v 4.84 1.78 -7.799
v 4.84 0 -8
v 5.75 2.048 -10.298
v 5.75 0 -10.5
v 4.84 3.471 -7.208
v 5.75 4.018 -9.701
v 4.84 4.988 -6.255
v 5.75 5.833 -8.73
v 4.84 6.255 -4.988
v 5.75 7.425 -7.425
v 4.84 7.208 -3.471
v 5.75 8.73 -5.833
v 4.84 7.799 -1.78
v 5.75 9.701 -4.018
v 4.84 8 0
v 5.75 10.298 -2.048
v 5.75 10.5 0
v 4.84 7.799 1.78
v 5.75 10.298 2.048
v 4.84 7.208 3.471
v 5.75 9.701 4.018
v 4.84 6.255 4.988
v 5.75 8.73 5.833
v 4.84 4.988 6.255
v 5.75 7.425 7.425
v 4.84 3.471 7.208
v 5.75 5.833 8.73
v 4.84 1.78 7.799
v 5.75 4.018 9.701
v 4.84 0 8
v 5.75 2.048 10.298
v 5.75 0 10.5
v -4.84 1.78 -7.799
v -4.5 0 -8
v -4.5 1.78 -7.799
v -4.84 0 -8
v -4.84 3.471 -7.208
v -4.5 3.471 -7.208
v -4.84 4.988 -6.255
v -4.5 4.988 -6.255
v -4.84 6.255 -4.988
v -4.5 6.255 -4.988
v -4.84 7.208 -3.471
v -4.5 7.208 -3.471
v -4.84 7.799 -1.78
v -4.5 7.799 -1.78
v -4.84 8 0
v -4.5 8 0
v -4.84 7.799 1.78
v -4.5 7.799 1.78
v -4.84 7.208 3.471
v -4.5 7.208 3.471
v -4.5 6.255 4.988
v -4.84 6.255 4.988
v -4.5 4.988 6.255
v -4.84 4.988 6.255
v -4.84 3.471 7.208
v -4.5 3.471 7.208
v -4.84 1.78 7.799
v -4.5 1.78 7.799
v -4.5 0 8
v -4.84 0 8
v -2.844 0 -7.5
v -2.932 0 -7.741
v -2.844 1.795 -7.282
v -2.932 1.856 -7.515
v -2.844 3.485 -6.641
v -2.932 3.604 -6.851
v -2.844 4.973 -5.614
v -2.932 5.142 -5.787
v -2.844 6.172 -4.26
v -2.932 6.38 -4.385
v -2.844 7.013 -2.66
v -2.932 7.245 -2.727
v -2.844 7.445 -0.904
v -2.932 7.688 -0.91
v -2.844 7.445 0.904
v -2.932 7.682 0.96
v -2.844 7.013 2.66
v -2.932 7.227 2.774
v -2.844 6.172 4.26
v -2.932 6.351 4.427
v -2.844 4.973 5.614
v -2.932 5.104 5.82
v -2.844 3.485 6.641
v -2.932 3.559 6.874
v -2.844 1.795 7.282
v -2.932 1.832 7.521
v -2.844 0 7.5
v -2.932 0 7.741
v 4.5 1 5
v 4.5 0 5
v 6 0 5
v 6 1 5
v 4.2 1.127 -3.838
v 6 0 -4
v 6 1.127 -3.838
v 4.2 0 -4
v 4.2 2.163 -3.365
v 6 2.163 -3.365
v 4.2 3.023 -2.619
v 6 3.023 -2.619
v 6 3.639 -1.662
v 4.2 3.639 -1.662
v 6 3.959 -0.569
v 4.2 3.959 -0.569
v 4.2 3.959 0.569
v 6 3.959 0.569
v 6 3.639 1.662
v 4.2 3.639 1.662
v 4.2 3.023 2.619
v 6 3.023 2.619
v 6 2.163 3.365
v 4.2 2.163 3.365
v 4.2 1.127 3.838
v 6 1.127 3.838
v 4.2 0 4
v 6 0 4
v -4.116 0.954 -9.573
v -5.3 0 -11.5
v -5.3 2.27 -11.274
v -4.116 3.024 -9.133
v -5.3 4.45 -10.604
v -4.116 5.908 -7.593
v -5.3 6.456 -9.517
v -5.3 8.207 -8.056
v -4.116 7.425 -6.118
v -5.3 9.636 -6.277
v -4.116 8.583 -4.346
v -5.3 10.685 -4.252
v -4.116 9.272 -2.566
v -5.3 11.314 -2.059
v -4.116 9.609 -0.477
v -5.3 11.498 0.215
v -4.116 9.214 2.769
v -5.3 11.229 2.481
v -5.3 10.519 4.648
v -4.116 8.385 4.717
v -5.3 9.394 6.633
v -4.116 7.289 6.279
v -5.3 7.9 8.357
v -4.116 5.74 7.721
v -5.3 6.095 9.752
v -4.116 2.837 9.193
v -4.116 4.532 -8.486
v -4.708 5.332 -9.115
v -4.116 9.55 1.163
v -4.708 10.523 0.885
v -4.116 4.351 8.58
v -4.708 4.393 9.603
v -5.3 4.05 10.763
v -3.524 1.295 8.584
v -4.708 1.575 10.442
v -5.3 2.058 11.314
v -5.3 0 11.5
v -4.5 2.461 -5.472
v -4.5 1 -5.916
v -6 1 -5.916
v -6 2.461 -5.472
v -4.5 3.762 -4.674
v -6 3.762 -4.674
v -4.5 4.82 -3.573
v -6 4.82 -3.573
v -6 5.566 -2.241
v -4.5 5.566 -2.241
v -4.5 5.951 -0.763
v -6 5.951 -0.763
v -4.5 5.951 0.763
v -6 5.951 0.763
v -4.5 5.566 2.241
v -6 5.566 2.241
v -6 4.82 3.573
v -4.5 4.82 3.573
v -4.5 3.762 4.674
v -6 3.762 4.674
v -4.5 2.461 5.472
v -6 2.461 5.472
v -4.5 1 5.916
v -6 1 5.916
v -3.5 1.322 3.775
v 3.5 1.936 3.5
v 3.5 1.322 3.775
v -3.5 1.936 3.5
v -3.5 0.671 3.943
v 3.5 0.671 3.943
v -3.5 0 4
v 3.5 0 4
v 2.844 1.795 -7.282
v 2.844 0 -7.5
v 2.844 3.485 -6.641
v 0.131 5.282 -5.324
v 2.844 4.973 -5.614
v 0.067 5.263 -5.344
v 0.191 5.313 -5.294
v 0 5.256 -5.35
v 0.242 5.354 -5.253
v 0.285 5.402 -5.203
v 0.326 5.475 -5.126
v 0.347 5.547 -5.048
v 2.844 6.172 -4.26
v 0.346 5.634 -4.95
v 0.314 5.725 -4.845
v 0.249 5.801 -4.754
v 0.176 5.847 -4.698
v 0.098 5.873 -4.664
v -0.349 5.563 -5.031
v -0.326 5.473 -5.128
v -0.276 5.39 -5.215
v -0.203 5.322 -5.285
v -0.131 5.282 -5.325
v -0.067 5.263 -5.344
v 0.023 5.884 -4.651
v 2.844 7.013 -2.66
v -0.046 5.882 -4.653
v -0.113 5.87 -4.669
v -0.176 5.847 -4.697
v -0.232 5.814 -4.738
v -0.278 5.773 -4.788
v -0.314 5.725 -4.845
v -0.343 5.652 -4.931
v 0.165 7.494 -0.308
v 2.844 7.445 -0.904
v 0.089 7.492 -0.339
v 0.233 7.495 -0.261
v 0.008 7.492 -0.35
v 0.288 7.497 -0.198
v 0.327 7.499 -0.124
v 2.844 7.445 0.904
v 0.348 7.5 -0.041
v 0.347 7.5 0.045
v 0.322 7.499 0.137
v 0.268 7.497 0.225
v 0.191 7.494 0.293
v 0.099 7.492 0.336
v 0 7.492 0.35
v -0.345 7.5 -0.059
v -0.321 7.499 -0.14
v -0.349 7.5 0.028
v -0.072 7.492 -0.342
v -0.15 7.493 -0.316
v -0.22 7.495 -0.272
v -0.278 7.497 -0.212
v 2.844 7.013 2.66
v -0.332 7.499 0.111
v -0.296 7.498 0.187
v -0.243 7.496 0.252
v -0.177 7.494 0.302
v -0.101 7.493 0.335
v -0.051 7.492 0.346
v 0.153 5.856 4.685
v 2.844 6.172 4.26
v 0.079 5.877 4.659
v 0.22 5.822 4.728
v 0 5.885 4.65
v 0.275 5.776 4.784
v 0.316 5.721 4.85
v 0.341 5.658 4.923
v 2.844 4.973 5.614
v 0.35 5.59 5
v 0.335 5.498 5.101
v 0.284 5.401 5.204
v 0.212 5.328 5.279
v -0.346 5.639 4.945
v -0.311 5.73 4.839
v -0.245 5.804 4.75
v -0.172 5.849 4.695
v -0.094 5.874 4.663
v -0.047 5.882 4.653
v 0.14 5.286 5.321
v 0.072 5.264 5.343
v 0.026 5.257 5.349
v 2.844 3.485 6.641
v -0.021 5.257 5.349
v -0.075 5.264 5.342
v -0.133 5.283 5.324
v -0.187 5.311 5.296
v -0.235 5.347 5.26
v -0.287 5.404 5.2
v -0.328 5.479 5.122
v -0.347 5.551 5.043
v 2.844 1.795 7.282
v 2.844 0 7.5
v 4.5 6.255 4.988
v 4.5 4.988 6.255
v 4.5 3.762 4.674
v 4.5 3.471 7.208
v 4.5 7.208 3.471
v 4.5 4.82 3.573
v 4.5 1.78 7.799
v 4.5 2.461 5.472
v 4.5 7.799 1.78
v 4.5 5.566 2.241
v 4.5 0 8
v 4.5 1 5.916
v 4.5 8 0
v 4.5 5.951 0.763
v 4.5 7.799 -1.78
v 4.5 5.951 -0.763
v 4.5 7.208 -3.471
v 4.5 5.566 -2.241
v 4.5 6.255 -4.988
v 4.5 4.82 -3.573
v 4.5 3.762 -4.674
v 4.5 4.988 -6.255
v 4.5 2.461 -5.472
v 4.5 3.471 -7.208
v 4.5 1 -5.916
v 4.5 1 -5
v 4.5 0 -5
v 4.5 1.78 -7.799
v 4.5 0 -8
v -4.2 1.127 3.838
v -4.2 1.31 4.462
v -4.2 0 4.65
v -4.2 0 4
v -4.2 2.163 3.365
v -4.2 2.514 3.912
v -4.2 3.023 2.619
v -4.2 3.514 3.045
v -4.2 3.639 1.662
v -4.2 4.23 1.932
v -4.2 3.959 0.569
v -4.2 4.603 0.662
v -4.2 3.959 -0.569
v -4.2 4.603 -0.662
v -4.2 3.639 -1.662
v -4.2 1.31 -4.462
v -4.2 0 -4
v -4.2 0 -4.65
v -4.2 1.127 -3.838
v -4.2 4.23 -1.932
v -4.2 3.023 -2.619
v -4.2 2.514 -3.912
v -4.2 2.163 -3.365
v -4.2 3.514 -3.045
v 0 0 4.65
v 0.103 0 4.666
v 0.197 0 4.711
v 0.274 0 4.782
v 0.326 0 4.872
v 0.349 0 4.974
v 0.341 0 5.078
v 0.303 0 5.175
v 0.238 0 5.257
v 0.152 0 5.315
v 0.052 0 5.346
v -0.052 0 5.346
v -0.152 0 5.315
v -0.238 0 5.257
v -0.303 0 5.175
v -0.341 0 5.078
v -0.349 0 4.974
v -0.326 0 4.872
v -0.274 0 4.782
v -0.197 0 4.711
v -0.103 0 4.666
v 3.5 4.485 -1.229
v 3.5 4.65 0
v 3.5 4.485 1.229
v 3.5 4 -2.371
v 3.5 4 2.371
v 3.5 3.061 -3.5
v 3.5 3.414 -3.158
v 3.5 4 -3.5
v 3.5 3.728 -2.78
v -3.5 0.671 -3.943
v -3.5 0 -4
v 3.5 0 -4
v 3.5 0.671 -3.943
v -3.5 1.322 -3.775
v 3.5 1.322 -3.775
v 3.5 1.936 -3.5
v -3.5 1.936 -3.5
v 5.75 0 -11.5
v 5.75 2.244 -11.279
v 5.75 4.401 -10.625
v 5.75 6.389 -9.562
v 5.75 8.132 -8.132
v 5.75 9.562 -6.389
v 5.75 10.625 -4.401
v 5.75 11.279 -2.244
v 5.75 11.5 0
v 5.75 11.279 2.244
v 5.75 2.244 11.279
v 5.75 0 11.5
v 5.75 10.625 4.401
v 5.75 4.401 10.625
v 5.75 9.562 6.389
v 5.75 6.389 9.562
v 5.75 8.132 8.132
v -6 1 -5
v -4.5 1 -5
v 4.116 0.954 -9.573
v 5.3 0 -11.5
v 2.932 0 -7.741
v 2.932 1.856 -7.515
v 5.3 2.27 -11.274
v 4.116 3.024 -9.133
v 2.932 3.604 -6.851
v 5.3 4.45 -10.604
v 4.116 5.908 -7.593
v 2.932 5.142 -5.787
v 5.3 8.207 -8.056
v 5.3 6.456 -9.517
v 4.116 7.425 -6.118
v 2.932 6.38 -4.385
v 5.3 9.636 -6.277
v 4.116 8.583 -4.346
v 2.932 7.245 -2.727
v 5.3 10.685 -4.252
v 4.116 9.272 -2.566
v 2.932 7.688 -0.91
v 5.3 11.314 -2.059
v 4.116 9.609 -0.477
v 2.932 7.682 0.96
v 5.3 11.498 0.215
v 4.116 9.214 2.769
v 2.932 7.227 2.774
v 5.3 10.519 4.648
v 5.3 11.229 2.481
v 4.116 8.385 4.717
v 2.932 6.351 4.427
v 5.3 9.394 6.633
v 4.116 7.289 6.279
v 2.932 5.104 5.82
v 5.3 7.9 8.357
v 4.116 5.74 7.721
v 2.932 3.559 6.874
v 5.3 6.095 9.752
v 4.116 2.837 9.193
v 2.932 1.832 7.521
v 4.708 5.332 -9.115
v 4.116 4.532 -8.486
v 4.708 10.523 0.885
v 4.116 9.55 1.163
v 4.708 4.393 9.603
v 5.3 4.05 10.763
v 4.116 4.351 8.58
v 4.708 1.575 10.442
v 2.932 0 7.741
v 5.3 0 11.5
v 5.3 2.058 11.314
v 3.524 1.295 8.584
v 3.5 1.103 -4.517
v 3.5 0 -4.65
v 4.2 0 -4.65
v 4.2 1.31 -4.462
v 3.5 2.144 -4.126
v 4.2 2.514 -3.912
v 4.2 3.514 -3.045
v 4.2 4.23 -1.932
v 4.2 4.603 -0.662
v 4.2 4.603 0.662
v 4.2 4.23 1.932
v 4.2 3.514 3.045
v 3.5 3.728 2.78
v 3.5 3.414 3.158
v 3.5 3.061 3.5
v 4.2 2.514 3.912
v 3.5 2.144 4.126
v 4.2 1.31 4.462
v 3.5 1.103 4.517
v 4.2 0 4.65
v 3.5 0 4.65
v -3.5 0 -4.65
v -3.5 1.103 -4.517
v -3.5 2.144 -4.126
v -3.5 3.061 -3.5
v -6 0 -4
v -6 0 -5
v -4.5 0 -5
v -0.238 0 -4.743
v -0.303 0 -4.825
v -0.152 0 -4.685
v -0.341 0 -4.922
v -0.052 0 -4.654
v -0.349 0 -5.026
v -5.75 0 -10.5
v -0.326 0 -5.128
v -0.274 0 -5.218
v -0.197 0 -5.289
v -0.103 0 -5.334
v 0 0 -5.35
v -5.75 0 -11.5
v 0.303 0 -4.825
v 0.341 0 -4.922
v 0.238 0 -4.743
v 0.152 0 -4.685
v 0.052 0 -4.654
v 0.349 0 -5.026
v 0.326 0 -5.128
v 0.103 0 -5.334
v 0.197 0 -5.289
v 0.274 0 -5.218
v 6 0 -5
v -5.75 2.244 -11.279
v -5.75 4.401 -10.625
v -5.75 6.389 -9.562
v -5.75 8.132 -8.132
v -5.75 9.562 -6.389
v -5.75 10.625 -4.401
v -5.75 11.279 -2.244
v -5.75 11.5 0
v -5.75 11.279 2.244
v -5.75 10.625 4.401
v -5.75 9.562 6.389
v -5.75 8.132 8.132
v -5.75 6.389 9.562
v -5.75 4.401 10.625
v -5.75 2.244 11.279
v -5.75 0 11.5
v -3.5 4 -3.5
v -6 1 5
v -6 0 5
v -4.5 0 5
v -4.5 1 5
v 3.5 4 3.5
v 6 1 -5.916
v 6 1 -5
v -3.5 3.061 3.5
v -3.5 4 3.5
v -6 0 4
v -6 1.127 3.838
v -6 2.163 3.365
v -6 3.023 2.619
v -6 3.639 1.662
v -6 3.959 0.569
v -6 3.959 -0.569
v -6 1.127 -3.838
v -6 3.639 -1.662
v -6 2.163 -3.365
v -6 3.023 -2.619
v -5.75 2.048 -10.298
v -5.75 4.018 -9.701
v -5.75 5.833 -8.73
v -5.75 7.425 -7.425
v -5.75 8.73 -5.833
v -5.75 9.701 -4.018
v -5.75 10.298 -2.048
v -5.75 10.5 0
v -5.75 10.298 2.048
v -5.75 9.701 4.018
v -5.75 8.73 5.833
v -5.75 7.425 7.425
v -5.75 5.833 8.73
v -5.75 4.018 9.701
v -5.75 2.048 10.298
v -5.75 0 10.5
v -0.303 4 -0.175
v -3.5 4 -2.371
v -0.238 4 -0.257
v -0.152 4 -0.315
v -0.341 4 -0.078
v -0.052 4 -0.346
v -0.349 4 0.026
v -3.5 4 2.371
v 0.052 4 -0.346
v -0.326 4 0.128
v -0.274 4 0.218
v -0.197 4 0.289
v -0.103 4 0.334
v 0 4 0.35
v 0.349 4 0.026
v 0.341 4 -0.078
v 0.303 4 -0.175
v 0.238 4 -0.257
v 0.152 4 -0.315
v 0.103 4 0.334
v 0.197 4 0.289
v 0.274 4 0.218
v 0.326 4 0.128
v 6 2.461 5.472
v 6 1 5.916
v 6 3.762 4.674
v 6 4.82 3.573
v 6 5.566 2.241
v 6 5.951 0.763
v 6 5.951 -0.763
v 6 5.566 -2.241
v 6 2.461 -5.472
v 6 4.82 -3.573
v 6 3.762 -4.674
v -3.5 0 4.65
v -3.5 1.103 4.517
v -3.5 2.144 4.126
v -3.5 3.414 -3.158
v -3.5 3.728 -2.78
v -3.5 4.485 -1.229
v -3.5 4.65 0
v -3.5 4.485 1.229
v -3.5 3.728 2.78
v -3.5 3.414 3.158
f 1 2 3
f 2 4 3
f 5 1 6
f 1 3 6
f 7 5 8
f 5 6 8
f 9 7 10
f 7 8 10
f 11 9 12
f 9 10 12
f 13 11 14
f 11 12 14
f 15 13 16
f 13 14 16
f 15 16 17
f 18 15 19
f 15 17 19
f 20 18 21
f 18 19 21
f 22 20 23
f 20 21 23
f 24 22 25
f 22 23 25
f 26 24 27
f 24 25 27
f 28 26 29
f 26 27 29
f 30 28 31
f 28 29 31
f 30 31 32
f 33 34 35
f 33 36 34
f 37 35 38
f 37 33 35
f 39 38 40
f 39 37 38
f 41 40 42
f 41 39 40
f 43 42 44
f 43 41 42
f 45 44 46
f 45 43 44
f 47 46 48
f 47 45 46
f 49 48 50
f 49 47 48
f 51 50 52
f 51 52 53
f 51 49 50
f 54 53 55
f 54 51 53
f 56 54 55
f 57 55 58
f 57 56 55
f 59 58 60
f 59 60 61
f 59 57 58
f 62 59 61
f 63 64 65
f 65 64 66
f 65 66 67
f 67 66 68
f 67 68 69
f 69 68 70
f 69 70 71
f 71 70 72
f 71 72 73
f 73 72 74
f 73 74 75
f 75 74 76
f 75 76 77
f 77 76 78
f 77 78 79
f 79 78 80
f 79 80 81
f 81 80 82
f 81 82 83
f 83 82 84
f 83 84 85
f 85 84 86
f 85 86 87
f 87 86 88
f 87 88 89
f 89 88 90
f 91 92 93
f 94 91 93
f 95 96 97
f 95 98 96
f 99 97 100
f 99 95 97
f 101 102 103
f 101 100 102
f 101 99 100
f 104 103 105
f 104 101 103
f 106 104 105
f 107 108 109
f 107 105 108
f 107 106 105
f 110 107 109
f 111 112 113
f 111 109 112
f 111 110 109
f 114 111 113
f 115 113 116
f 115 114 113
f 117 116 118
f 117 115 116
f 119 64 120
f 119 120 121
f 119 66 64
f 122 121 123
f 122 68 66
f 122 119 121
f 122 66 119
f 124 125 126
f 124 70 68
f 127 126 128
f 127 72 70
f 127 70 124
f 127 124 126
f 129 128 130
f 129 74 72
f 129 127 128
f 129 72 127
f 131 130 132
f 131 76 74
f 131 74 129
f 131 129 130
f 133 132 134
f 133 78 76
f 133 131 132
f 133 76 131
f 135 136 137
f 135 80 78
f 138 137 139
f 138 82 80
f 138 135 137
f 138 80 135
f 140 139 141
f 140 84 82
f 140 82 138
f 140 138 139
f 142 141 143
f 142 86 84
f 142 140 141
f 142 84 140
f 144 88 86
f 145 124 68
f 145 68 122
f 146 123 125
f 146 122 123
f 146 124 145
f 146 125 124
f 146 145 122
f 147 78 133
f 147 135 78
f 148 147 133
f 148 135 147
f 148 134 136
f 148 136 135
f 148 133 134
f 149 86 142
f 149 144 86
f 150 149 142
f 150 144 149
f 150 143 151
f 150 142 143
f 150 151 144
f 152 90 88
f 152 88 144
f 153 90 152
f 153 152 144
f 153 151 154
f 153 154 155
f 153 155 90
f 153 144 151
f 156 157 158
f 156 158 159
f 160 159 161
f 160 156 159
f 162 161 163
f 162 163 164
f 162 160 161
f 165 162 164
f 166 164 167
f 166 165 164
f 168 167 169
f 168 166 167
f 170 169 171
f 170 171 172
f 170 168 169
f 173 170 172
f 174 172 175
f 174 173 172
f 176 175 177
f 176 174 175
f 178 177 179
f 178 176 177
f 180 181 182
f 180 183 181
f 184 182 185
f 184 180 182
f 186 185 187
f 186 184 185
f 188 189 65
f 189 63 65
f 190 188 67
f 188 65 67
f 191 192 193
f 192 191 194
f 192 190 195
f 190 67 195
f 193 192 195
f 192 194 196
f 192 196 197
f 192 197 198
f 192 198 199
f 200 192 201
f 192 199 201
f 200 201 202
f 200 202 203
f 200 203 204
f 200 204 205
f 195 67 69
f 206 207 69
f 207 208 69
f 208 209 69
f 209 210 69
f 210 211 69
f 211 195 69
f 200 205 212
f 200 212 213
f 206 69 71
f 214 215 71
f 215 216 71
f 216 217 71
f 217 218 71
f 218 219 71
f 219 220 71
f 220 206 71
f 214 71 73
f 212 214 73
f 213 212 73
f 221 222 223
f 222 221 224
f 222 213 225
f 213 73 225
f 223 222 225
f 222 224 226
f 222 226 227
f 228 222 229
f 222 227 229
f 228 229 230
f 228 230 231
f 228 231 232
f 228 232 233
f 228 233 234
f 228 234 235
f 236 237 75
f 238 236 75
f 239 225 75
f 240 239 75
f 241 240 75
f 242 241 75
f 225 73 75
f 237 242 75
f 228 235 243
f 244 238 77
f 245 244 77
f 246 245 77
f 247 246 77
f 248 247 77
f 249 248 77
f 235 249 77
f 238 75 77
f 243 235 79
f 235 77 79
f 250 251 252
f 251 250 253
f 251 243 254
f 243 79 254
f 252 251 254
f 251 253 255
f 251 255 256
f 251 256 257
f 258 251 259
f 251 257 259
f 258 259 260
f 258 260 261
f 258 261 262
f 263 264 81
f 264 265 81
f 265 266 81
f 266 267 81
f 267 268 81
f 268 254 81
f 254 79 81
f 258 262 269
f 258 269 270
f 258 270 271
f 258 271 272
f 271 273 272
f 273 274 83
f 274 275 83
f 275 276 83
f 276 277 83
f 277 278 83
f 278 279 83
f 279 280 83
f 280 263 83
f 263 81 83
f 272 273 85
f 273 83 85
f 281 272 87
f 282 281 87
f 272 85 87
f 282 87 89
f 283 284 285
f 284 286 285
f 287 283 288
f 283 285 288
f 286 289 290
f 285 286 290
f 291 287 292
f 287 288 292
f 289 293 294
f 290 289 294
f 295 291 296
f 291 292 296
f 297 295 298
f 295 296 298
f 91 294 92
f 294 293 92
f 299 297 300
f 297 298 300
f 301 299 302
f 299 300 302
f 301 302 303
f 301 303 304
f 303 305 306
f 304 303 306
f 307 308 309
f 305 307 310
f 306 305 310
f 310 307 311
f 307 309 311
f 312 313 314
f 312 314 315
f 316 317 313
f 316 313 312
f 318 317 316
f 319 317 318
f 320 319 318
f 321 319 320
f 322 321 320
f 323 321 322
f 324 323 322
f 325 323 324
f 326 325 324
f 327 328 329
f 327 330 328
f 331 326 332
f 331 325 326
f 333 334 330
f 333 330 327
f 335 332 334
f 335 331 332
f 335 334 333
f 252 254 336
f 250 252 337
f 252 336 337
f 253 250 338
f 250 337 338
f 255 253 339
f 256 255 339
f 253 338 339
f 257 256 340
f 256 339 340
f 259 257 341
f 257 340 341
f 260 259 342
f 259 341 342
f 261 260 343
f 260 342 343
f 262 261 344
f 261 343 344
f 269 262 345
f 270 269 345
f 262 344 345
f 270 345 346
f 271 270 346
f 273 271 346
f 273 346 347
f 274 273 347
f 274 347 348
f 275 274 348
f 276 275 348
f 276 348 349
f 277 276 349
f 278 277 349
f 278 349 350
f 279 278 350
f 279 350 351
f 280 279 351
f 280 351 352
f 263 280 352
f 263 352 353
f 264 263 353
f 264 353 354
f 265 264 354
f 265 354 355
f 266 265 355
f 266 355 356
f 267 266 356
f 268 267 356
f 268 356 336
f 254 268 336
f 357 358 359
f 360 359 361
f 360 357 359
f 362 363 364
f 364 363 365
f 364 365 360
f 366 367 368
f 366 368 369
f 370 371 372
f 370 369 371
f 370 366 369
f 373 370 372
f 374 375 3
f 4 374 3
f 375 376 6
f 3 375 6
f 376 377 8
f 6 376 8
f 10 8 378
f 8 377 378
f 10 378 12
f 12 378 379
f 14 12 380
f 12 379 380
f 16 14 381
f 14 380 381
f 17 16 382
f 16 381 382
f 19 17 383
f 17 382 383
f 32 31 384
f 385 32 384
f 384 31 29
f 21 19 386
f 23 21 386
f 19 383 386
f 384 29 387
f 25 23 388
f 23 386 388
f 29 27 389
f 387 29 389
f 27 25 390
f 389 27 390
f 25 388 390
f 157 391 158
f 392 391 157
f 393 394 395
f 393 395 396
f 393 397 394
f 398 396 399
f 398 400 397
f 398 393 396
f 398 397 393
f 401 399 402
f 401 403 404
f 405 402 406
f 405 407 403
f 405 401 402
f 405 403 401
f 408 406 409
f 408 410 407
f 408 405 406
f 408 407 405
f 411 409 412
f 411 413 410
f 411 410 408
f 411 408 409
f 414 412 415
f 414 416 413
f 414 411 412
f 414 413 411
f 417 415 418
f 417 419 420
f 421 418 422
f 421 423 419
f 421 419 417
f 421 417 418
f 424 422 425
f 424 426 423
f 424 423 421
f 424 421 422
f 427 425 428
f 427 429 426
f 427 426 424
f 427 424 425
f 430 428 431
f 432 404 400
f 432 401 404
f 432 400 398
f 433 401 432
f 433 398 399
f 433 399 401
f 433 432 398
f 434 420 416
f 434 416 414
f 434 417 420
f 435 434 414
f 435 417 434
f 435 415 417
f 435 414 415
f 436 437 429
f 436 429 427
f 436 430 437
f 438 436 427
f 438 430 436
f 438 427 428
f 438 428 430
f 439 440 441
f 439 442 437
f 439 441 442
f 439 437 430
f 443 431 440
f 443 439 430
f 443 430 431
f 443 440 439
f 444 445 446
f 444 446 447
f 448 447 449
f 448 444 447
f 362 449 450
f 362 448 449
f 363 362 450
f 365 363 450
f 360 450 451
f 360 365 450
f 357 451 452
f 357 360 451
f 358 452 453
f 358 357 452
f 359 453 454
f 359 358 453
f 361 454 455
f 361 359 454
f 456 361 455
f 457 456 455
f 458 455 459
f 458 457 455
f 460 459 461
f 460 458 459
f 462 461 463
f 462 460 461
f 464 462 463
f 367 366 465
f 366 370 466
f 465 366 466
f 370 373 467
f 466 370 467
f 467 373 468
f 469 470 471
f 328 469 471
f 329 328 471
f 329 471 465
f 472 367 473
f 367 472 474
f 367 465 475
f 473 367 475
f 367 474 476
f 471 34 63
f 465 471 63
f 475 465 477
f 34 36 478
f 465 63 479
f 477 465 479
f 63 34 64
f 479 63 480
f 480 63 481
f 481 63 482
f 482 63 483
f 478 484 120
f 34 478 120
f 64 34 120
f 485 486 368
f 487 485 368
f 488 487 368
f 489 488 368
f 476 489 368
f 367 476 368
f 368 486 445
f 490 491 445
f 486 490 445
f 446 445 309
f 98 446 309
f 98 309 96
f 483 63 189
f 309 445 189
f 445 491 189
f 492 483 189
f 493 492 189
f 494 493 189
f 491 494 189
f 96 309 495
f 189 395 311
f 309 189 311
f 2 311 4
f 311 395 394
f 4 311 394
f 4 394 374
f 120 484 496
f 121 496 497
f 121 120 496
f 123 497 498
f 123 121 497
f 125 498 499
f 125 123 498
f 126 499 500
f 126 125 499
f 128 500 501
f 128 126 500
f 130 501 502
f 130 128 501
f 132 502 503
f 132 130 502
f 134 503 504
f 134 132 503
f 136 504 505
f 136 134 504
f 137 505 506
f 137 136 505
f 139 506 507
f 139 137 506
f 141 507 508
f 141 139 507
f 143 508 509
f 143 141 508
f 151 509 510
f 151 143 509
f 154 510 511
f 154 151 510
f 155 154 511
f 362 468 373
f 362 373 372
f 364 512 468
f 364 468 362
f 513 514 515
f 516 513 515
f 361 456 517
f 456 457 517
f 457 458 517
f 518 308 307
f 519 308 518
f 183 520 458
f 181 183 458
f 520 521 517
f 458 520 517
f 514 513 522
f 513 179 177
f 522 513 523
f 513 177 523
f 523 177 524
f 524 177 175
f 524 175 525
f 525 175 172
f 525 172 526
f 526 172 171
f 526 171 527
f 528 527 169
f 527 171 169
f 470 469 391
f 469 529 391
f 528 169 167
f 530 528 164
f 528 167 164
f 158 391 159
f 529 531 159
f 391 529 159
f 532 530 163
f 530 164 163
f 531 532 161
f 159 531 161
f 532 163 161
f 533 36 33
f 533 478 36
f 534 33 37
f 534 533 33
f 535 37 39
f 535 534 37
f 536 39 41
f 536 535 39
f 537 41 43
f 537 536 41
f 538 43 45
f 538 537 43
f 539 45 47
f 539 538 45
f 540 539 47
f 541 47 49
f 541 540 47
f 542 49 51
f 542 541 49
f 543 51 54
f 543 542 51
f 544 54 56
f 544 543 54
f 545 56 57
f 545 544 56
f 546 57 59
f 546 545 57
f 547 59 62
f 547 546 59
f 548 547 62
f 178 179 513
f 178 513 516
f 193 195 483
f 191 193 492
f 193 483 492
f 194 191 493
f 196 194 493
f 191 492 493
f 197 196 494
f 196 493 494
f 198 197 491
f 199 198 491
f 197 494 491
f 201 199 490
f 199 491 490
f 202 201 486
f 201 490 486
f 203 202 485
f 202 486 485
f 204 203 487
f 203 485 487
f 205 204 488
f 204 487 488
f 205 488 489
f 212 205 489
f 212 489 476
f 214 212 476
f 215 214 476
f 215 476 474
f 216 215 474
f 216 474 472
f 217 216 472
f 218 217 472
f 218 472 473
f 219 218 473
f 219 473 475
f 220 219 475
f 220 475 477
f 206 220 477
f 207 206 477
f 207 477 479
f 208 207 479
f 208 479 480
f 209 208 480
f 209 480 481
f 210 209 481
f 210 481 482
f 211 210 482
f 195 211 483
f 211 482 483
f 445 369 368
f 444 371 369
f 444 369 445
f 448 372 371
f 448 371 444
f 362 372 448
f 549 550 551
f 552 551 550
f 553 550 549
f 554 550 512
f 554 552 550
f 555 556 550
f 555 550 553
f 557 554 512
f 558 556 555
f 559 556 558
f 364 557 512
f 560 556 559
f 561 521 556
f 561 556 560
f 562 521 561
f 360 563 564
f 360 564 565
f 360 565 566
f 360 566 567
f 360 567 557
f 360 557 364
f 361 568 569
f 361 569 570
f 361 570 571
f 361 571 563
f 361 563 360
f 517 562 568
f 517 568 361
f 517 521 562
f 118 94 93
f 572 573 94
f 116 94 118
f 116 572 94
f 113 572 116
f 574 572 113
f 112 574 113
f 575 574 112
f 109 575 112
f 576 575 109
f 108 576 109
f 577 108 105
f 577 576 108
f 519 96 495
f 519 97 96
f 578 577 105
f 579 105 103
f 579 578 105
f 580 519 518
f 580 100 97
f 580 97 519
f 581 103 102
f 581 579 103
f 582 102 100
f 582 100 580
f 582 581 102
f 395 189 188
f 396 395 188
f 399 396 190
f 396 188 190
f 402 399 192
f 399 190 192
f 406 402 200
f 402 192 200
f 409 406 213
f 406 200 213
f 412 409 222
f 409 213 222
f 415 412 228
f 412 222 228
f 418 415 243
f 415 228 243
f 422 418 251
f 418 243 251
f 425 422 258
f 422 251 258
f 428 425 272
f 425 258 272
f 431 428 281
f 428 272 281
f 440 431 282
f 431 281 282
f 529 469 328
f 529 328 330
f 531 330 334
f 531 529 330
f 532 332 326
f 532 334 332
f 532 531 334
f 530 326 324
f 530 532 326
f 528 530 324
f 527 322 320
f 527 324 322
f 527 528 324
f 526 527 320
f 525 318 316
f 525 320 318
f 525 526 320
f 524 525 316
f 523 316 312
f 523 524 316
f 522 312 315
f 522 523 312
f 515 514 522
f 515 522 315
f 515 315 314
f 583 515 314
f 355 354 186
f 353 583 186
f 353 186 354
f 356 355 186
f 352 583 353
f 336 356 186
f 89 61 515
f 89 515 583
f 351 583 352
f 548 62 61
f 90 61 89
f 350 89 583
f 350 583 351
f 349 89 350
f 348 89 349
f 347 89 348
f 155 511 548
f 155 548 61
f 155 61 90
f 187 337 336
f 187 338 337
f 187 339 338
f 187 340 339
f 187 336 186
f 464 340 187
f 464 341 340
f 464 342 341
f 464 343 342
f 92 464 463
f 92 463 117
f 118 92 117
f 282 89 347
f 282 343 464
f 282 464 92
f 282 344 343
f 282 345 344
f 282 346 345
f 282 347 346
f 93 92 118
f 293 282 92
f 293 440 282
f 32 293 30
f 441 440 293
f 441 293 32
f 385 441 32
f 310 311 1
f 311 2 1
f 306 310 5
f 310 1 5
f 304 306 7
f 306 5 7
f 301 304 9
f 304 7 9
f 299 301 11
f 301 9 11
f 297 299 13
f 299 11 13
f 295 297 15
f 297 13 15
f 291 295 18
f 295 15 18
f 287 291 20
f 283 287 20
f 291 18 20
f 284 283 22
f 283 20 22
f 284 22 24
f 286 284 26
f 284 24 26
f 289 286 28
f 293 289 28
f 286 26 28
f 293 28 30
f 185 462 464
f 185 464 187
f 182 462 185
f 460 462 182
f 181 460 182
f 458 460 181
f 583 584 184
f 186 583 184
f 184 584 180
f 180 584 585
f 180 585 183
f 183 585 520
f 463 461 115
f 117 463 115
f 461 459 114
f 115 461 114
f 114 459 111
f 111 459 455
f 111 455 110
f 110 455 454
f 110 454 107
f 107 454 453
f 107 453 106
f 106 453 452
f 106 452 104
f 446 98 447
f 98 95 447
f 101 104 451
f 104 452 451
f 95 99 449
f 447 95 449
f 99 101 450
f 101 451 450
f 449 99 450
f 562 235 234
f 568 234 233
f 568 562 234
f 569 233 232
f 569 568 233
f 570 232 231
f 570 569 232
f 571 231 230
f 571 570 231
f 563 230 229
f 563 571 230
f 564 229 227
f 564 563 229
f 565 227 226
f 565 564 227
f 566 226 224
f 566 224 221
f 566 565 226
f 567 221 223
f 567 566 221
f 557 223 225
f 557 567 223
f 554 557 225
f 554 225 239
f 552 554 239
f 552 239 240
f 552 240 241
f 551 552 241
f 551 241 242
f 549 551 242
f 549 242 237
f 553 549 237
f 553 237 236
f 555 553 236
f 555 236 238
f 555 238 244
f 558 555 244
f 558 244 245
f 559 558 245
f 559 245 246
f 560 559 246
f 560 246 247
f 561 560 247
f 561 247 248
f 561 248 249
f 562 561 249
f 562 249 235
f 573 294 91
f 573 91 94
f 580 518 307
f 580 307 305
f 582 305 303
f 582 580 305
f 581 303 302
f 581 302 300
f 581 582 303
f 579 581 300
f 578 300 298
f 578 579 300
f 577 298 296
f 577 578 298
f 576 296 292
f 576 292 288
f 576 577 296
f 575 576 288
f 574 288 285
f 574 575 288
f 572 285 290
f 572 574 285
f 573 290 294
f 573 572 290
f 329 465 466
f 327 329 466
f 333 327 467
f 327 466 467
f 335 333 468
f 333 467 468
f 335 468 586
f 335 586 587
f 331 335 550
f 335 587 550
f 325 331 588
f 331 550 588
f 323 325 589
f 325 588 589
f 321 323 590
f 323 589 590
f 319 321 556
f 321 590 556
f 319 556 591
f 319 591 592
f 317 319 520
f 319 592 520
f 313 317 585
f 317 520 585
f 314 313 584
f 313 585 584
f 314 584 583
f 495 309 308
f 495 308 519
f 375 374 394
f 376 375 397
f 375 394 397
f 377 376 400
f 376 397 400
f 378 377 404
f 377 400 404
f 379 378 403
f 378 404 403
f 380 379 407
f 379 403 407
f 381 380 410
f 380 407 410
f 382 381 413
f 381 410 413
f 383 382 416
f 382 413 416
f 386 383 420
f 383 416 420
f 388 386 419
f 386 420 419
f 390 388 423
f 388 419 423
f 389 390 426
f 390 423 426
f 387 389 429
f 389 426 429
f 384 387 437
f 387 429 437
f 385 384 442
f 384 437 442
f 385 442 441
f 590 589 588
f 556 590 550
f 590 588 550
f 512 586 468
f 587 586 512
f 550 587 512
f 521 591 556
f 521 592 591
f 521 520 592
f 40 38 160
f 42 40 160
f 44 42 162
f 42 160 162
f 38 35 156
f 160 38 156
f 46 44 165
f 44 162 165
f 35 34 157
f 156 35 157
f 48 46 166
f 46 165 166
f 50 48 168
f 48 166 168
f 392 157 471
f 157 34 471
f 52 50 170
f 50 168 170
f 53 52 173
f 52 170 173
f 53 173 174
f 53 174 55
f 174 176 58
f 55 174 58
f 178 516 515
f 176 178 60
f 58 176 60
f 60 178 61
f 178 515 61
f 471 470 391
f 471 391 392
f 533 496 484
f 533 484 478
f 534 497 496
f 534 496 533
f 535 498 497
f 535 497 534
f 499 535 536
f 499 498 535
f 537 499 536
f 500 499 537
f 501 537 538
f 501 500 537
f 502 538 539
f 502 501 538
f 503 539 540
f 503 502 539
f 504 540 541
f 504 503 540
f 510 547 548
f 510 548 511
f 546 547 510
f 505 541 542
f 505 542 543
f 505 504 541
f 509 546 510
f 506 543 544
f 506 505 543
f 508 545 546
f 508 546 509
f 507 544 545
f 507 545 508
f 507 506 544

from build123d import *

# Parameters (mm, degrees)
PADSKE_R             = 6
PAD_DEPTH            = 6
HOLE_DEPTH           = 18.334935823
HOLE_DEPTH_BACK      = 18.334935823
HOLESKE_R            = 4
SCREWHOLE_DEPTH      = 18.334935823
SCREWHOLE_DEPTH_BACK = 18.334935823
SCREWHOLESKE_R       = 0.35
BOXSKE_W             = 7
BOXSKE_H             = 8
BOX_DEPTH            = 3.5
CUTSKE_W             = 26
CUTSKE_H             = 26
CUT_DEPTH            = 20
SCREWHOLE2SKE_R      = 0.35
SCREWHOLE2_DEPTH     = 18.334935823
SLOTSKE_W            = 1.5
SLOTSKE_H            = 1
SLOT_DEPTH           = 1
FLANGESLOTSKE_R      = 4.65
FLANGESLOT_DEPTH     = 0.7
EDGE_2_ANGLE         = 180
CHAMFER_2_SIZE       = 1
CHAMFER_2_SIZE2      = 4
CHAMFER2_SIZE        = 4
CHAMFER2_SIZE2       = 1


with BuildPart() as part:
    # BodySke → Body (revolve)
    with BuildSketch(Plane(origin=(0, 0, 0), x_dir=(1, 0, 0), z_dir=(0, 1, 0)), mode=Mode.PRIVATE) as body_sk:
        Polygon((4.5, 0), (4.5, 11.5), (4.3, 11.5), (2.298163712, 6), (-2.298163712, 6), (-4.3, 11.5), (-4.5, 11.5), (-4.5, 0), align=None)
    revolve(body_sk.sketch.rotate(Axis((-4.5, 0, 0), (1, 0, 0)), 180), axis=Axis((-4.5, 0, 0), (1, 0, 0)))

    # BoldSke → Bold (revolve)
    with BuildSketch(Plane(origin=(0, 0, 0), x_dir=(1, 0, 0), z_dir=(0, 1, 0)), mode=Mode.PRIVATE) as bold_sk:
        Polygon((-2.298163712, 6), (2.298163712, 6), (2.844119063, 7.5), (-2.844119063, 7.5), align=None)
    revolve(bold_sk.sketch.rotate(Axis((0, 0, 0), (1, 0, 0)), 180), axis=Axis((0, 0, 0), (1, 0, 0)))

    # PadSke → Pad (add, symmetric)
    with BuildSketch(Plane(origin=(0, 0, 0), x_dir=(0, 0, -1), z_dir=(1, 0, 0))):
        Circle(PADSKE_R)
    extrude(amount=PAD_DEPTH, both=True)

    # HoleSke → Hole (cut, two sides: drawn at the far end of the back side and taken through both)
    with BuildSketch(Plane(origin=(0, 0, 0), x_dir=(0, 0, -1), z_dir=(1, 0, 0)).offset(-HOLE_DEPTH_BACK)):
        Circle(HOLESKE_R)
    extrude(amount=HOLE_DEPTH + HOLE_DEPTH_BACK, mode=Mode.SUBTRACT)

    # ScrewHoleSke → ScrewHole (cut, two sides: drawn at the far end of the back side and taken through both)
    with BuildSketch(Plane(origin=(0, 0, 0), x_dir=(1, 0, 0), z_dir=(0, 1, 0)).offset(-SCREWHOLE_DEPTH_BACK)):
        with Locations(Location((0, 0, 0), (0, 0, 270))):
            Circle(SCREWHOLESKE_R)
    extrude(amount=SCREWHOLE_DEPTH + SCREWHOLE_DEPTH_BACK, mode=Mode.SUBTRACT)

    # BoxSke → Box (cut, symmetric)
    with BuildSketch(Plane.XY):
        Rectangle(BOXSKE_W, BOXSKE_H)
    extrude(amount=BOX_DEPTH, both=True, mode=Mode.SUBTRACT)

    # CutSke → Cut (cut)
    with BuildSketch(Plane(origin=(0, 0, 0), x_dir=(1, 0, 0), z_dir=(0, 1, 0))):
        Rectangle(CUTSKE_W, CUTSKE_H)
    extrude(amount=-CUT_DEPTH, mode=Mode.SUBTRACT)

    # ScrewHole2Ske → ScrewHole2 (cut, through all)
    with BuildSketch(Plane.XZ):
        with Locations(Location((0, -5, 0), (0, 0, 270))):
            Circle(SCREWHOLE2SKE_R)
        with Locations(Location((0, 5, 0), (0, 0, 270))):
            Circle(SCREWHOLE2SKE_R)
    extrude(amount=-SCREWHOLE2_DEPTH, mode=Mode.SUBTRACT)

    # SlotSke → Slot (cut)
    with BuildSketch(Plane.XZ):
        with Locations((-5.25, 5.5)):
            Rectangle(SLOTSKE_W, SLOTSKE_H)
        with Locations((5.25, 5.5)):
            Rectangle(SLOTSKE_W, SLOTSKE_H)
        with Locations((5.25, -5.5)):
            Rectangle(SLOTSKE_W, SLOTSKE_H)
        with Locations((-5.25, -5.5)):
            Rectangle(SLOTSKE_W, SLOTSKE_H)
    extrude(amount=-SLOT_DEPTH, mode=Mode.SUBTRACT)

    # FlangeSlotSke → FlangeSlot (cut)
    with BuildSketch(Plane(origin=(-3.5, 0, 0), x_dir=(0, 0, -1), z_dir=(1, 0, 0))):
        Circle(FLANGESLOTSKE_R)
    flangeslot = extrude(amount=-FLANGESLOT_DEPTH, mode=Mode.SUBTRACT)

    # FlangeSlot2: FlangeSlot across plane
    add(flangeslot.mirror(Plane(origin=(0, 0, 0), x_dir=(0, 0, 1), z_dir=(1, 0, 0))), mode=Mode.SUBTRACT)

    # EdgeSke → Edge 2 (revolve)
    with BuildSketch(Plane(origin=(0, 0, 0), x_dir=(1, 0, 0), z_dir=(0, 1, 0))):
        Polygon((4.5, 8), (4.840074414, 8), (5.75, 10.5), (5.75, 11.5), (4.5, 11.5), align=None)
        Polygon((-5.75, 11.5), (-4.5, 11.5), (-4.5, 8), (-4.840074414, 8), (-5.75, 10.5), align=None)
    revolve(axis=Axis((-4.5, 0, 0), (1, 0, 0)), revolution_arc=EDGE_2_ANGLE)

    # Chamfer 2
    chamfer_2_edges = [part.edges().sort_by_distance(p)[0] for p in [
        (4.3, 11.5, 0),
    ]]
    chamfer_2_side = [part.faces().sort_by_distance(p)[0] for p in [
        (4.4, 11.5, 0),
    ]]
    chamfer(chamfer_2_edges, length=CHAMFER_2_SIZE, length2=CHAMFER_2_SIZE2, reference=chamfer_2_side[0])

    # Chamfer2
    chamfer2_edges = [part.edges().sort_by_distance(p)[0] for p in [
        (-4.3, 11.5, 0),
    ]]
    chamfer2_side = [part.faces().sort_by_distance(p)[0] for p in [
        (-3.572059531, 9.5, 0),
    ]]
    chamfer(chamfer2_edges, length=CHAMFER2_SIZE, length2=CHAMFER2_SIZE2, reference=chamfer2_side[0])


solid = part.part
